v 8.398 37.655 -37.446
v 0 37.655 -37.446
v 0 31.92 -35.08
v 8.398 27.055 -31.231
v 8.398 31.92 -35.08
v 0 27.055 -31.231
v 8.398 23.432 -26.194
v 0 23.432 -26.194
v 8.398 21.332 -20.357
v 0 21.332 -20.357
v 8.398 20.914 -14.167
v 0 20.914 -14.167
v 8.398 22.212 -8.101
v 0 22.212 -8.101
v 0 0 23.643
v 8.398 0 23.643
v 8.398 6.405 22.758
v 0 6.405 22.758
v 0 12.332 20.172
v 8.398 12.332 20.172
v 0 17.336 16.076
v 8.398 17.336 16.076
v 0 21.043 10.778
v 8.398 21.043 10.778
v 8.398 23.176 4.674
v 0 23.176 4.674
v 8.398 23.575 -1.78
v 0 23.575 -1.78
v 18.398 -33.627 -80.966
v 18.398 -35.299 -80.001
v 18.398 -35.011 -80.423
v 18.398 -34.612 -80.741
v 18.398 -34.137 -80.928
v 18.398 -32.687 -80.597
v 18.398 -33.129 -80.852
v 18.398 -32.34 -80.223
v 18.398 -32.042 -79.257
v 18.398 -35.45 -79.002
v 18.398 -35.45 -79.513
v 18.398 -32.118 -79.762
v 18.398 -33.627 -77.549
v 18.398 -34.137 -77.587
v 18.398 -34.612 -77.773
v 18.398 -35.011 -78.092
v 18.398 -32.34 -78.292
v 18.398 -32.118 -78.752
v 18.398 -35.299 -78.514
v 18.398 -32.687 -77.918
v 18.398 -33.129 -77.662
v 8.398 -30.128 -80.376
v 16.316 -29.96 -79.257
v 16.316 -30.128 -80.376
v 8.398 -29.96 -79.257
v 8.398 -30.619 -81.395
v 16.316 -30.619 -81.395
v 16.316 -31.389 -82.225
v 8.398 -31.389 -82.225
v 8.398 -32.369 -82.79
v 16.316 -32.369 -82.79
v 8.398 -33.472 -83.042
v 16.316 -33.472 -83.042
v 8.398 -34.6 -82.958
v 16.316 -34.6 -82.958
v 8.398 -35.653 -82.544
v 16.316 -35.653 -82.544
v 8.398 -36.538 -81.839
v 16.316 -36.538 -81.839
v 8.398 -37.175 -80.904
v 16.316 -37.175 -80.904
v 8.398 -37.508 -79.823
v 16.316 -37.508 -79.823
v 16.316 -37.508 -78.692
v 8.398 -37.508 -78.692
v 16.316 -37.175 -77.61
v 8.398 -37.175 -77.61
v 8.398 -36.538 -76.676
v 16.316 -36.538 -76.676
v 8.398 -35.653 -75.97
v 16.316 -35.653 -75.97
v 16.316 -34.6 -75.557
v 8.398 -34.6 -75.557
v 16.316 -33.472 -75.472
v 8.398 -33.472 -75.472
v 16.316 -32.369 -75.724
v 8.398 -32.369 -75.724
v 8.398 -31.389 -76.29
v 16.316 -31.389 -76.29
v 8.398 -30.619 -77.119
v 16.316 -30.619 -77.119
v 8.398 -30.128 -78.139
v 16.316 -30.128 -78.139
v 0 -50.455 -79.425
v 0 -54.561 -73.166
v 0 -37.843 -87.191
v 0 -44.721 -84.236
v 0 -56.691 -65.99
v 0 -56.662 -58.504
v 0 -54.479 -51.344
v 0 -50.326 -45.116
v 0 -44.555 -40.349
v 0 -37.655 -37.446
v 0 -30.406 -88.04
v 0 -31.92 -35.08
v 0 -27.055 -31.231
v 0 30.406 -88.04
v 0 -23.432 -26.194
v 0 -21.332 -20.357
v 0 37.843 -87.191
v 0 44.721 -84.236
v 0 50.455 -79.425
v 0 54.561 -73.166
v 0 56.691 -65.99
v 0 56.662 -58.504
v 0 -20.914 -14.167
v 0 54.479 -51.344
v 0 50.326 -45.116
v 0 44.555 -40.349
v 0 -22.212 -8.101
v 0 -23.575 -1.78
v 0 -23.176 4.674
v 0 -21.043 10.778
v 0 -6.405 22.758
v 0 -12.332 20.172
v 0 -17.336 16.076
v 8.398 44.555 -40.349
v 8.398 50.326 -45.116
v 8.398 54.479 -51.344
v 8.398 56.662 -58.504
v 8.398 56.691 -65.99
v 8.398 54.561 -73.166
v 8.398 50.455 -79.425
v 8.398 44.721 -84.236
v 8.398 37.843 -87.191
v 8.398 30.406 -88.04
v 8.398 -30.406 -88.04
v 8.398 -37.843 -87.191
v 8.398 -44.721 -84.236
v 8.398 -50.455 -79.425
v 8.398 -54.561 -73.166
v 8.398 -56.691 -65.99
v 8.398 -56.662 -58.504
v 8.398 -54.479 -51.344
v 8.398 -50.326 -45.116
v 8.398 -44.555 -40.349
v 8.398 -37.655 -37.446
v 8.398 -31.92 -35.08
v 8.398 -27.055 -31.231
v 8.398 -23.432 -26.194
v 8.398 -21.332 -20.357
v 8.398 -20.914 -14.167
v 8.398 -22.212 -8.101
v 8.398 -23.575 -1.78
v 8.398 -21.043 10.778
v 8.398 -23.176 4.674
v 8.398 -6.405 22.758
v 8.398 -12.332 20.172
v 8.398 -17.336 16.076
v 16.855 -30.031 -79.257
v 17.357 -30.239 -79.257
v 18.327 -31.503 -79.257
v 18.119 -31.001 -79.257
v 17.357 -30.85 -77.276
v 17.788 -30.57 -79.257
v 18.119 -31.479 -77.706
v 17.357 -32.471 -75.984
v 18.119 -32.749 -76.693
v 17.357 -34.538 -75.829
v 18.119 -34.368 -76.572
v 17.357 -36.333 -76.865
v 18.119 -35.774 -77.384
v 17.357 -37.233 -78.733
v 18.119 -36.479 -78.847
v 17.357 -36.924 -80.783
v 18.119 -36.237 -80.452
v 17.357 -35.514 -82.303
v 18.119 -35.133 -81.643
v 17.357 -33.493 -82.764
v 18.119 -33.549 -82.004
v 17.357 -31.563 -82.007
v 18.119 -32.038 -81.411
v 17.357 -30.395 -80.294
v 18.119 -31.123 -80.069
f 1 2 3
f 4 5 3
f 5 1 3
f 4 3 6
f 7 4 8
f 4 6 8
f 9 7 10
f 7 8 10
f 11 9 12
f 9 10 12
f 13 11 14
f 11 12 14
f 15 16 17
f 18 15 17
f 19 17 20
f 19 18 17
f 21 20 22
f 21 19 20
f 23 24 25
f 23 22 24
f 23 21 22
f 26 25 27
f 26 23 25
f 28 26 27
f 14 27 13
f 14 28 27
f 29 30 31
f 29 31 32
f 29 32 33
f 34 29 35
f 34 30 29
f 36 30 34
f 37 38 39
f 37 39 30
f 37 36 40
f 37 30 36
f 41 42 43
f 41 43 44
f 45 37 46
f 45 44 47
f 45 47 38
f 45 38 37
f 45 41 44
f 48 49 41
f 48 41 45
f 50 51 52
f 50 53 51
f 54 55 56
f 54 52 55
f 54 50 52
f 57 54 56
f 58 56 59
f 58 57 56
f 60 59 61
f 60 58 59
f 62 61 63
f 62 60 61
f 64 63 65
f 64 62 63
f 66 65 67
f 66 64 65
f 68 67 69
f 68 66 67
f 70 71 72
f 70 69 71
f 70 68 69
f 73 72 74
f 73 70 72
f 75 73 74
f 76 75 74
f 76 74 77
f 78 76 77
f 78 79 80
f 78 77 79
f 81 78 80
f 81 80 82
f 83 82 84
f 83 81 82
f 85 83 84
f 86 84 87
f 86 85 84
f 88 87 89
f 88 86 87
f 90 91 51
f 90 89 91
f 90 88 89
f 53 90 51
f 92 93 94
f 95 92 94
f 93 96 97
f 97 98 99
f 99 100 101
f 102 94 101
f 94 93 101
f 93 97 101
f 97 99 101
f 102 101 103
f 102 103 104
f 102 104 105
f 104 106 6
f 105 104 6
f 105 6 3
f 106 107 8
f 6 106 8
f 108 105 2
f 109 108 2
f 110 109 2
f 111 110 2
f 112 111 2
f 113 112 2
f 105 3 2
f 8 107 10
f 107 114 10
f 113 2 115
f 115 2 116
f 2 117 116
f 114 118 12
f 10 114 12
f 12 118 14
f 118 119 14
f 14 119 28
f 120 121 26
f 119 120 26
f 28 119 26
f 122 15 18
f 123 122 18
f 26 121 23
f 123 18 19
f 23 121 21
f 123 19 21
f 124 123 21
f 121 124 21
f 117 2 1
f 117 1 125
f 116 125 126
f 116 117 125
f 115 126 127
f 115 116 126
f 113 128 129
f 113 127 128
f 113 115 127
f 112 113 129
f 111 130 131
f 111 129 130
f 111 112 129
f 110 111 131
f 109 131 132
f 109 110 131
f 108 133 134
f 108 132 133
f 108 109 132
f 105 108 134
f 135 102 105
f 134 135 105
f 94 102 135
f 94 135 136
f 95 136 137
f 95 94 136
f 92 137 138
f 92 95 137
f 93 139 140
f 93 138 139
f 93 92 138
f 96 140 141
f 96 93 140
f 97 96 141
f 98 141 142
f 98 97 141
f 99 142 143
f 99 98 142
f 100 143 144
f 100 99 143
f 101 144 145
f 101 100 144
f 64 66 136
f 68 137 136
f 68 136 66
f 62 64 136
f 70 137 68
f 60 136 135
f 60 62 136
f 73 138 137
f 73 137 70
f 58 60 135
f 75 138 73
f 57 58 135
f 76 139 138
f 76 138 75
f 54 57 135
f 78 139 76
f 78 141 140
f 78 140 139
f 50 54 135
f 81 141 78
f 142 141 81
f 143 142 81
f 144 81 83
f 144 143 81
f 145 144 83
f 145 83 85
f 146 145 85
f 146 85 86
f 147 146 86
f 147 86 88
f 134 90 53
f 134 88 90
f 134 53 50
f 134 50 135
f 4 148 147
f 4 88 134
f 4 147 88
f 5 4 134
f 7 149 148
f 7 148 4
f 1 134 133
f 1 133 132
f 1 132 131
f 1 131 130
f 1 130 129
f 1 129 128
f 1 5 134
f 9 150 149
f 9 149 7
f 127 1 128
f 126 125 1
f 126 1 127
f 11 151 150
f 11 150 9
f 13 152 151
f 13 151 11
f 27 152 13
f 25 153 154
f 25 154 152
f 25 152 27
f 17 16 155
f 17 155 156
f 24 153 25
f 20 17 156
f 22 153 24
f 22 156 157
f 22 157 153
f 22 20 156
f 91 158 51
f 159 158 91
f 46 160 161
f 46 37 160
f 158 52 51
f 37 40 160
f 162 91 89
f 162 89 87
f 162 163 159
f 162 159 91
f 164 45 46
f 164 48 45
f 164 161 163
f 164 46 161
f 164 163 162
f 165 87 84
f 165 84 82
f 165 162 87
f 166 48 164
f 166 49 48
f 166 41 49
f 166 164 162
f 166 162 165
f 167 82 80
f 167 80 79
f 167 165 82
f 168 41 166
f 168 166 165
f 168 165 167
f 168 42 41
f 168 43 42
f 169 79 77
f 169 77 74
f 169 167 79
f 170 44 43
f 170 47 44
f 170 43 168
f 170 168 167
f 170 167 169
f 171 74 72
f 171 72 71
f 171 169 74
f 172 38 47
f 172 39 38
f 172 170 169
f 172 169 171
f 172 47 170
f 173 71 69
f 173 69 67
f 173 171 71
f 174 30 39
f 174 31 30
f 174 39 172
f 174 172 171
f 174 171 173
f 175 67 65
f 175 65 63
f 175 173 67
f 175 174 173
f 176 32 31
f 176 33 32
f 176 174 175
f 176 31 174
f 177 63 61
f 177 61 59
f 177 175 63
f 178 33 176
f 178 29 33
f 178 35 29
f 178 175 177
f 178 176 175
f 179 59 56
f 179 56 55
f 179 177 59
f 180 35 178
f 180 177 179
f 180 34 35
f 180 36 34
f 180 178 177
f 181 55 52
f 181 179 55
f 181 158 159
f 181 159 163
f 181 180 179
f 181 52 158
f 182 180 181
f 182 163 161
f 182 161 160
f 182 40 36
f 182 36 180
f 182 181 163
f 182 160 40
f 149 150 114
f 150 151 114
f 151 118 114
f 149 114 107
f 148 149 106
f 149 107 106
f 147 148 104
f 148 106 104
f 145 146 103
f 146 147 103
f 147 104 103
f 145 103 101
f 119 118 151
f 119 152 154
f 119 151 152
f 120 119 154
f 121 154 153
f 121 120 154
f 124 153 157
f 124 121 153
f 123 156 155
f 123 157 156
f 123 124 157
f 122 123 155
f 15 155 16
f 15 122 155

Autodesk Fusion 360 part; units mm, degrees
sketch "Sketch1" plane through (0, 0, 0) normal (1, 0, 0) x (0, 1, 0)
  line L0 (0, 0) -> (0, -99.0463) construction
  line L1 (-30.4057, -88.0396) -> (0, -88.0396)
  arc A0 (-37.6553, -37.4456) -> (-22.2115, -8.1006) centre (-43.2405, -15.7698) ccw
  arc A1 (-37.6553, -37.4456) -> (-30.4057, -88.0396) centre (-31.2401, -62.3428) ccw
  arc A2 (0, 23.6426) -> (-22.2115, -8.1006) centre (0, 0) ccw
  arc A3 (22.2115, -8.1006) -> (0, 23.6426) centre (0, 0) ccw
  line L2 (30.4057, -88.0396) -> (0, -88.0396)
  arc A4 (30.4057, -88.0396) -> (37.6553, -37.4456) centre (31.2401, -62.3428) ccw
  arc A5 (22.2115, -8.1006) -> (37.6553, -37.4456) centre (43.2405, -15.7698) ccw
extrude "Extrude1" add sketch "Sketch1" along normal blind 8.398
sketch "Sketch2" plane through (8.398, 0, 0) normal (1, 0, 0) x (0, 1, 0)
  circle A0 centre (-33.7553, -79.2573) radius 3.7955
extrude "Extrude2" add sketch "Sketch2" along normal blind 10
fillet "Fillet1" radius 2.082 1 edges at (18.398, -37.294, -80.6298)
sketch "Sketch3" plane through (8.398, 0, 0) normal (1, 0, 0) x (0, 1, 0)
  circle A0 centre (-33.7553, -79.2573) radius 3.7955
  arc A1 (22.2115, -8.1006) -> (-22.2115, -8.1006) centre (0, 0) ccw
  arc A2 (-37.6553, -37.4456) -> (-22.2115, -8.1006) centre (-43.2405, -15.7698) ccw
  arc A3 (-37.6553, -37.4456) -> (-30.4057, -88.0396) centre (-31.2401, -62.3428) ccw
  line L0 (-30.4057, -88.0396) -> (30.4057, -88.0396)
  arc A4 (30.4057, -88.0396) -> (37.6553, -37.4456) centre (31.2401, -62.3428) ccw
  arc A5 (22.2115, -8.1006) -> (37.6553, -37.4456) centre (43.2405, -15.7698) ccw
  arc A6 (14.1938, -5.1765) -> (-14.1938, -5.1765) centre (0, 0) ccw
  arc A7 (-35.5258, -45.7099) -> (-14.1938, -5.1765) centre (-43.2405, -15.7698) ccw
  arc A8 (-35.5258, -45.7099) -> (-30.5582, -79.5054) centre (-31.2401, -62.3428) ccw
  line L1 (-30.5582, -79.5054) -> (30.5582, -79.5054)
  arc A9 (30.5582, -79.5054) -> (35.5258, -45.7099) centre (31.2401, -62.3428) ccw
  arc A10 (14.1938, -5.1765) -> (35.5258, -45.7099) centre (43.2405, -15.7698) ccw
  dimension "d6" = 8.5343
